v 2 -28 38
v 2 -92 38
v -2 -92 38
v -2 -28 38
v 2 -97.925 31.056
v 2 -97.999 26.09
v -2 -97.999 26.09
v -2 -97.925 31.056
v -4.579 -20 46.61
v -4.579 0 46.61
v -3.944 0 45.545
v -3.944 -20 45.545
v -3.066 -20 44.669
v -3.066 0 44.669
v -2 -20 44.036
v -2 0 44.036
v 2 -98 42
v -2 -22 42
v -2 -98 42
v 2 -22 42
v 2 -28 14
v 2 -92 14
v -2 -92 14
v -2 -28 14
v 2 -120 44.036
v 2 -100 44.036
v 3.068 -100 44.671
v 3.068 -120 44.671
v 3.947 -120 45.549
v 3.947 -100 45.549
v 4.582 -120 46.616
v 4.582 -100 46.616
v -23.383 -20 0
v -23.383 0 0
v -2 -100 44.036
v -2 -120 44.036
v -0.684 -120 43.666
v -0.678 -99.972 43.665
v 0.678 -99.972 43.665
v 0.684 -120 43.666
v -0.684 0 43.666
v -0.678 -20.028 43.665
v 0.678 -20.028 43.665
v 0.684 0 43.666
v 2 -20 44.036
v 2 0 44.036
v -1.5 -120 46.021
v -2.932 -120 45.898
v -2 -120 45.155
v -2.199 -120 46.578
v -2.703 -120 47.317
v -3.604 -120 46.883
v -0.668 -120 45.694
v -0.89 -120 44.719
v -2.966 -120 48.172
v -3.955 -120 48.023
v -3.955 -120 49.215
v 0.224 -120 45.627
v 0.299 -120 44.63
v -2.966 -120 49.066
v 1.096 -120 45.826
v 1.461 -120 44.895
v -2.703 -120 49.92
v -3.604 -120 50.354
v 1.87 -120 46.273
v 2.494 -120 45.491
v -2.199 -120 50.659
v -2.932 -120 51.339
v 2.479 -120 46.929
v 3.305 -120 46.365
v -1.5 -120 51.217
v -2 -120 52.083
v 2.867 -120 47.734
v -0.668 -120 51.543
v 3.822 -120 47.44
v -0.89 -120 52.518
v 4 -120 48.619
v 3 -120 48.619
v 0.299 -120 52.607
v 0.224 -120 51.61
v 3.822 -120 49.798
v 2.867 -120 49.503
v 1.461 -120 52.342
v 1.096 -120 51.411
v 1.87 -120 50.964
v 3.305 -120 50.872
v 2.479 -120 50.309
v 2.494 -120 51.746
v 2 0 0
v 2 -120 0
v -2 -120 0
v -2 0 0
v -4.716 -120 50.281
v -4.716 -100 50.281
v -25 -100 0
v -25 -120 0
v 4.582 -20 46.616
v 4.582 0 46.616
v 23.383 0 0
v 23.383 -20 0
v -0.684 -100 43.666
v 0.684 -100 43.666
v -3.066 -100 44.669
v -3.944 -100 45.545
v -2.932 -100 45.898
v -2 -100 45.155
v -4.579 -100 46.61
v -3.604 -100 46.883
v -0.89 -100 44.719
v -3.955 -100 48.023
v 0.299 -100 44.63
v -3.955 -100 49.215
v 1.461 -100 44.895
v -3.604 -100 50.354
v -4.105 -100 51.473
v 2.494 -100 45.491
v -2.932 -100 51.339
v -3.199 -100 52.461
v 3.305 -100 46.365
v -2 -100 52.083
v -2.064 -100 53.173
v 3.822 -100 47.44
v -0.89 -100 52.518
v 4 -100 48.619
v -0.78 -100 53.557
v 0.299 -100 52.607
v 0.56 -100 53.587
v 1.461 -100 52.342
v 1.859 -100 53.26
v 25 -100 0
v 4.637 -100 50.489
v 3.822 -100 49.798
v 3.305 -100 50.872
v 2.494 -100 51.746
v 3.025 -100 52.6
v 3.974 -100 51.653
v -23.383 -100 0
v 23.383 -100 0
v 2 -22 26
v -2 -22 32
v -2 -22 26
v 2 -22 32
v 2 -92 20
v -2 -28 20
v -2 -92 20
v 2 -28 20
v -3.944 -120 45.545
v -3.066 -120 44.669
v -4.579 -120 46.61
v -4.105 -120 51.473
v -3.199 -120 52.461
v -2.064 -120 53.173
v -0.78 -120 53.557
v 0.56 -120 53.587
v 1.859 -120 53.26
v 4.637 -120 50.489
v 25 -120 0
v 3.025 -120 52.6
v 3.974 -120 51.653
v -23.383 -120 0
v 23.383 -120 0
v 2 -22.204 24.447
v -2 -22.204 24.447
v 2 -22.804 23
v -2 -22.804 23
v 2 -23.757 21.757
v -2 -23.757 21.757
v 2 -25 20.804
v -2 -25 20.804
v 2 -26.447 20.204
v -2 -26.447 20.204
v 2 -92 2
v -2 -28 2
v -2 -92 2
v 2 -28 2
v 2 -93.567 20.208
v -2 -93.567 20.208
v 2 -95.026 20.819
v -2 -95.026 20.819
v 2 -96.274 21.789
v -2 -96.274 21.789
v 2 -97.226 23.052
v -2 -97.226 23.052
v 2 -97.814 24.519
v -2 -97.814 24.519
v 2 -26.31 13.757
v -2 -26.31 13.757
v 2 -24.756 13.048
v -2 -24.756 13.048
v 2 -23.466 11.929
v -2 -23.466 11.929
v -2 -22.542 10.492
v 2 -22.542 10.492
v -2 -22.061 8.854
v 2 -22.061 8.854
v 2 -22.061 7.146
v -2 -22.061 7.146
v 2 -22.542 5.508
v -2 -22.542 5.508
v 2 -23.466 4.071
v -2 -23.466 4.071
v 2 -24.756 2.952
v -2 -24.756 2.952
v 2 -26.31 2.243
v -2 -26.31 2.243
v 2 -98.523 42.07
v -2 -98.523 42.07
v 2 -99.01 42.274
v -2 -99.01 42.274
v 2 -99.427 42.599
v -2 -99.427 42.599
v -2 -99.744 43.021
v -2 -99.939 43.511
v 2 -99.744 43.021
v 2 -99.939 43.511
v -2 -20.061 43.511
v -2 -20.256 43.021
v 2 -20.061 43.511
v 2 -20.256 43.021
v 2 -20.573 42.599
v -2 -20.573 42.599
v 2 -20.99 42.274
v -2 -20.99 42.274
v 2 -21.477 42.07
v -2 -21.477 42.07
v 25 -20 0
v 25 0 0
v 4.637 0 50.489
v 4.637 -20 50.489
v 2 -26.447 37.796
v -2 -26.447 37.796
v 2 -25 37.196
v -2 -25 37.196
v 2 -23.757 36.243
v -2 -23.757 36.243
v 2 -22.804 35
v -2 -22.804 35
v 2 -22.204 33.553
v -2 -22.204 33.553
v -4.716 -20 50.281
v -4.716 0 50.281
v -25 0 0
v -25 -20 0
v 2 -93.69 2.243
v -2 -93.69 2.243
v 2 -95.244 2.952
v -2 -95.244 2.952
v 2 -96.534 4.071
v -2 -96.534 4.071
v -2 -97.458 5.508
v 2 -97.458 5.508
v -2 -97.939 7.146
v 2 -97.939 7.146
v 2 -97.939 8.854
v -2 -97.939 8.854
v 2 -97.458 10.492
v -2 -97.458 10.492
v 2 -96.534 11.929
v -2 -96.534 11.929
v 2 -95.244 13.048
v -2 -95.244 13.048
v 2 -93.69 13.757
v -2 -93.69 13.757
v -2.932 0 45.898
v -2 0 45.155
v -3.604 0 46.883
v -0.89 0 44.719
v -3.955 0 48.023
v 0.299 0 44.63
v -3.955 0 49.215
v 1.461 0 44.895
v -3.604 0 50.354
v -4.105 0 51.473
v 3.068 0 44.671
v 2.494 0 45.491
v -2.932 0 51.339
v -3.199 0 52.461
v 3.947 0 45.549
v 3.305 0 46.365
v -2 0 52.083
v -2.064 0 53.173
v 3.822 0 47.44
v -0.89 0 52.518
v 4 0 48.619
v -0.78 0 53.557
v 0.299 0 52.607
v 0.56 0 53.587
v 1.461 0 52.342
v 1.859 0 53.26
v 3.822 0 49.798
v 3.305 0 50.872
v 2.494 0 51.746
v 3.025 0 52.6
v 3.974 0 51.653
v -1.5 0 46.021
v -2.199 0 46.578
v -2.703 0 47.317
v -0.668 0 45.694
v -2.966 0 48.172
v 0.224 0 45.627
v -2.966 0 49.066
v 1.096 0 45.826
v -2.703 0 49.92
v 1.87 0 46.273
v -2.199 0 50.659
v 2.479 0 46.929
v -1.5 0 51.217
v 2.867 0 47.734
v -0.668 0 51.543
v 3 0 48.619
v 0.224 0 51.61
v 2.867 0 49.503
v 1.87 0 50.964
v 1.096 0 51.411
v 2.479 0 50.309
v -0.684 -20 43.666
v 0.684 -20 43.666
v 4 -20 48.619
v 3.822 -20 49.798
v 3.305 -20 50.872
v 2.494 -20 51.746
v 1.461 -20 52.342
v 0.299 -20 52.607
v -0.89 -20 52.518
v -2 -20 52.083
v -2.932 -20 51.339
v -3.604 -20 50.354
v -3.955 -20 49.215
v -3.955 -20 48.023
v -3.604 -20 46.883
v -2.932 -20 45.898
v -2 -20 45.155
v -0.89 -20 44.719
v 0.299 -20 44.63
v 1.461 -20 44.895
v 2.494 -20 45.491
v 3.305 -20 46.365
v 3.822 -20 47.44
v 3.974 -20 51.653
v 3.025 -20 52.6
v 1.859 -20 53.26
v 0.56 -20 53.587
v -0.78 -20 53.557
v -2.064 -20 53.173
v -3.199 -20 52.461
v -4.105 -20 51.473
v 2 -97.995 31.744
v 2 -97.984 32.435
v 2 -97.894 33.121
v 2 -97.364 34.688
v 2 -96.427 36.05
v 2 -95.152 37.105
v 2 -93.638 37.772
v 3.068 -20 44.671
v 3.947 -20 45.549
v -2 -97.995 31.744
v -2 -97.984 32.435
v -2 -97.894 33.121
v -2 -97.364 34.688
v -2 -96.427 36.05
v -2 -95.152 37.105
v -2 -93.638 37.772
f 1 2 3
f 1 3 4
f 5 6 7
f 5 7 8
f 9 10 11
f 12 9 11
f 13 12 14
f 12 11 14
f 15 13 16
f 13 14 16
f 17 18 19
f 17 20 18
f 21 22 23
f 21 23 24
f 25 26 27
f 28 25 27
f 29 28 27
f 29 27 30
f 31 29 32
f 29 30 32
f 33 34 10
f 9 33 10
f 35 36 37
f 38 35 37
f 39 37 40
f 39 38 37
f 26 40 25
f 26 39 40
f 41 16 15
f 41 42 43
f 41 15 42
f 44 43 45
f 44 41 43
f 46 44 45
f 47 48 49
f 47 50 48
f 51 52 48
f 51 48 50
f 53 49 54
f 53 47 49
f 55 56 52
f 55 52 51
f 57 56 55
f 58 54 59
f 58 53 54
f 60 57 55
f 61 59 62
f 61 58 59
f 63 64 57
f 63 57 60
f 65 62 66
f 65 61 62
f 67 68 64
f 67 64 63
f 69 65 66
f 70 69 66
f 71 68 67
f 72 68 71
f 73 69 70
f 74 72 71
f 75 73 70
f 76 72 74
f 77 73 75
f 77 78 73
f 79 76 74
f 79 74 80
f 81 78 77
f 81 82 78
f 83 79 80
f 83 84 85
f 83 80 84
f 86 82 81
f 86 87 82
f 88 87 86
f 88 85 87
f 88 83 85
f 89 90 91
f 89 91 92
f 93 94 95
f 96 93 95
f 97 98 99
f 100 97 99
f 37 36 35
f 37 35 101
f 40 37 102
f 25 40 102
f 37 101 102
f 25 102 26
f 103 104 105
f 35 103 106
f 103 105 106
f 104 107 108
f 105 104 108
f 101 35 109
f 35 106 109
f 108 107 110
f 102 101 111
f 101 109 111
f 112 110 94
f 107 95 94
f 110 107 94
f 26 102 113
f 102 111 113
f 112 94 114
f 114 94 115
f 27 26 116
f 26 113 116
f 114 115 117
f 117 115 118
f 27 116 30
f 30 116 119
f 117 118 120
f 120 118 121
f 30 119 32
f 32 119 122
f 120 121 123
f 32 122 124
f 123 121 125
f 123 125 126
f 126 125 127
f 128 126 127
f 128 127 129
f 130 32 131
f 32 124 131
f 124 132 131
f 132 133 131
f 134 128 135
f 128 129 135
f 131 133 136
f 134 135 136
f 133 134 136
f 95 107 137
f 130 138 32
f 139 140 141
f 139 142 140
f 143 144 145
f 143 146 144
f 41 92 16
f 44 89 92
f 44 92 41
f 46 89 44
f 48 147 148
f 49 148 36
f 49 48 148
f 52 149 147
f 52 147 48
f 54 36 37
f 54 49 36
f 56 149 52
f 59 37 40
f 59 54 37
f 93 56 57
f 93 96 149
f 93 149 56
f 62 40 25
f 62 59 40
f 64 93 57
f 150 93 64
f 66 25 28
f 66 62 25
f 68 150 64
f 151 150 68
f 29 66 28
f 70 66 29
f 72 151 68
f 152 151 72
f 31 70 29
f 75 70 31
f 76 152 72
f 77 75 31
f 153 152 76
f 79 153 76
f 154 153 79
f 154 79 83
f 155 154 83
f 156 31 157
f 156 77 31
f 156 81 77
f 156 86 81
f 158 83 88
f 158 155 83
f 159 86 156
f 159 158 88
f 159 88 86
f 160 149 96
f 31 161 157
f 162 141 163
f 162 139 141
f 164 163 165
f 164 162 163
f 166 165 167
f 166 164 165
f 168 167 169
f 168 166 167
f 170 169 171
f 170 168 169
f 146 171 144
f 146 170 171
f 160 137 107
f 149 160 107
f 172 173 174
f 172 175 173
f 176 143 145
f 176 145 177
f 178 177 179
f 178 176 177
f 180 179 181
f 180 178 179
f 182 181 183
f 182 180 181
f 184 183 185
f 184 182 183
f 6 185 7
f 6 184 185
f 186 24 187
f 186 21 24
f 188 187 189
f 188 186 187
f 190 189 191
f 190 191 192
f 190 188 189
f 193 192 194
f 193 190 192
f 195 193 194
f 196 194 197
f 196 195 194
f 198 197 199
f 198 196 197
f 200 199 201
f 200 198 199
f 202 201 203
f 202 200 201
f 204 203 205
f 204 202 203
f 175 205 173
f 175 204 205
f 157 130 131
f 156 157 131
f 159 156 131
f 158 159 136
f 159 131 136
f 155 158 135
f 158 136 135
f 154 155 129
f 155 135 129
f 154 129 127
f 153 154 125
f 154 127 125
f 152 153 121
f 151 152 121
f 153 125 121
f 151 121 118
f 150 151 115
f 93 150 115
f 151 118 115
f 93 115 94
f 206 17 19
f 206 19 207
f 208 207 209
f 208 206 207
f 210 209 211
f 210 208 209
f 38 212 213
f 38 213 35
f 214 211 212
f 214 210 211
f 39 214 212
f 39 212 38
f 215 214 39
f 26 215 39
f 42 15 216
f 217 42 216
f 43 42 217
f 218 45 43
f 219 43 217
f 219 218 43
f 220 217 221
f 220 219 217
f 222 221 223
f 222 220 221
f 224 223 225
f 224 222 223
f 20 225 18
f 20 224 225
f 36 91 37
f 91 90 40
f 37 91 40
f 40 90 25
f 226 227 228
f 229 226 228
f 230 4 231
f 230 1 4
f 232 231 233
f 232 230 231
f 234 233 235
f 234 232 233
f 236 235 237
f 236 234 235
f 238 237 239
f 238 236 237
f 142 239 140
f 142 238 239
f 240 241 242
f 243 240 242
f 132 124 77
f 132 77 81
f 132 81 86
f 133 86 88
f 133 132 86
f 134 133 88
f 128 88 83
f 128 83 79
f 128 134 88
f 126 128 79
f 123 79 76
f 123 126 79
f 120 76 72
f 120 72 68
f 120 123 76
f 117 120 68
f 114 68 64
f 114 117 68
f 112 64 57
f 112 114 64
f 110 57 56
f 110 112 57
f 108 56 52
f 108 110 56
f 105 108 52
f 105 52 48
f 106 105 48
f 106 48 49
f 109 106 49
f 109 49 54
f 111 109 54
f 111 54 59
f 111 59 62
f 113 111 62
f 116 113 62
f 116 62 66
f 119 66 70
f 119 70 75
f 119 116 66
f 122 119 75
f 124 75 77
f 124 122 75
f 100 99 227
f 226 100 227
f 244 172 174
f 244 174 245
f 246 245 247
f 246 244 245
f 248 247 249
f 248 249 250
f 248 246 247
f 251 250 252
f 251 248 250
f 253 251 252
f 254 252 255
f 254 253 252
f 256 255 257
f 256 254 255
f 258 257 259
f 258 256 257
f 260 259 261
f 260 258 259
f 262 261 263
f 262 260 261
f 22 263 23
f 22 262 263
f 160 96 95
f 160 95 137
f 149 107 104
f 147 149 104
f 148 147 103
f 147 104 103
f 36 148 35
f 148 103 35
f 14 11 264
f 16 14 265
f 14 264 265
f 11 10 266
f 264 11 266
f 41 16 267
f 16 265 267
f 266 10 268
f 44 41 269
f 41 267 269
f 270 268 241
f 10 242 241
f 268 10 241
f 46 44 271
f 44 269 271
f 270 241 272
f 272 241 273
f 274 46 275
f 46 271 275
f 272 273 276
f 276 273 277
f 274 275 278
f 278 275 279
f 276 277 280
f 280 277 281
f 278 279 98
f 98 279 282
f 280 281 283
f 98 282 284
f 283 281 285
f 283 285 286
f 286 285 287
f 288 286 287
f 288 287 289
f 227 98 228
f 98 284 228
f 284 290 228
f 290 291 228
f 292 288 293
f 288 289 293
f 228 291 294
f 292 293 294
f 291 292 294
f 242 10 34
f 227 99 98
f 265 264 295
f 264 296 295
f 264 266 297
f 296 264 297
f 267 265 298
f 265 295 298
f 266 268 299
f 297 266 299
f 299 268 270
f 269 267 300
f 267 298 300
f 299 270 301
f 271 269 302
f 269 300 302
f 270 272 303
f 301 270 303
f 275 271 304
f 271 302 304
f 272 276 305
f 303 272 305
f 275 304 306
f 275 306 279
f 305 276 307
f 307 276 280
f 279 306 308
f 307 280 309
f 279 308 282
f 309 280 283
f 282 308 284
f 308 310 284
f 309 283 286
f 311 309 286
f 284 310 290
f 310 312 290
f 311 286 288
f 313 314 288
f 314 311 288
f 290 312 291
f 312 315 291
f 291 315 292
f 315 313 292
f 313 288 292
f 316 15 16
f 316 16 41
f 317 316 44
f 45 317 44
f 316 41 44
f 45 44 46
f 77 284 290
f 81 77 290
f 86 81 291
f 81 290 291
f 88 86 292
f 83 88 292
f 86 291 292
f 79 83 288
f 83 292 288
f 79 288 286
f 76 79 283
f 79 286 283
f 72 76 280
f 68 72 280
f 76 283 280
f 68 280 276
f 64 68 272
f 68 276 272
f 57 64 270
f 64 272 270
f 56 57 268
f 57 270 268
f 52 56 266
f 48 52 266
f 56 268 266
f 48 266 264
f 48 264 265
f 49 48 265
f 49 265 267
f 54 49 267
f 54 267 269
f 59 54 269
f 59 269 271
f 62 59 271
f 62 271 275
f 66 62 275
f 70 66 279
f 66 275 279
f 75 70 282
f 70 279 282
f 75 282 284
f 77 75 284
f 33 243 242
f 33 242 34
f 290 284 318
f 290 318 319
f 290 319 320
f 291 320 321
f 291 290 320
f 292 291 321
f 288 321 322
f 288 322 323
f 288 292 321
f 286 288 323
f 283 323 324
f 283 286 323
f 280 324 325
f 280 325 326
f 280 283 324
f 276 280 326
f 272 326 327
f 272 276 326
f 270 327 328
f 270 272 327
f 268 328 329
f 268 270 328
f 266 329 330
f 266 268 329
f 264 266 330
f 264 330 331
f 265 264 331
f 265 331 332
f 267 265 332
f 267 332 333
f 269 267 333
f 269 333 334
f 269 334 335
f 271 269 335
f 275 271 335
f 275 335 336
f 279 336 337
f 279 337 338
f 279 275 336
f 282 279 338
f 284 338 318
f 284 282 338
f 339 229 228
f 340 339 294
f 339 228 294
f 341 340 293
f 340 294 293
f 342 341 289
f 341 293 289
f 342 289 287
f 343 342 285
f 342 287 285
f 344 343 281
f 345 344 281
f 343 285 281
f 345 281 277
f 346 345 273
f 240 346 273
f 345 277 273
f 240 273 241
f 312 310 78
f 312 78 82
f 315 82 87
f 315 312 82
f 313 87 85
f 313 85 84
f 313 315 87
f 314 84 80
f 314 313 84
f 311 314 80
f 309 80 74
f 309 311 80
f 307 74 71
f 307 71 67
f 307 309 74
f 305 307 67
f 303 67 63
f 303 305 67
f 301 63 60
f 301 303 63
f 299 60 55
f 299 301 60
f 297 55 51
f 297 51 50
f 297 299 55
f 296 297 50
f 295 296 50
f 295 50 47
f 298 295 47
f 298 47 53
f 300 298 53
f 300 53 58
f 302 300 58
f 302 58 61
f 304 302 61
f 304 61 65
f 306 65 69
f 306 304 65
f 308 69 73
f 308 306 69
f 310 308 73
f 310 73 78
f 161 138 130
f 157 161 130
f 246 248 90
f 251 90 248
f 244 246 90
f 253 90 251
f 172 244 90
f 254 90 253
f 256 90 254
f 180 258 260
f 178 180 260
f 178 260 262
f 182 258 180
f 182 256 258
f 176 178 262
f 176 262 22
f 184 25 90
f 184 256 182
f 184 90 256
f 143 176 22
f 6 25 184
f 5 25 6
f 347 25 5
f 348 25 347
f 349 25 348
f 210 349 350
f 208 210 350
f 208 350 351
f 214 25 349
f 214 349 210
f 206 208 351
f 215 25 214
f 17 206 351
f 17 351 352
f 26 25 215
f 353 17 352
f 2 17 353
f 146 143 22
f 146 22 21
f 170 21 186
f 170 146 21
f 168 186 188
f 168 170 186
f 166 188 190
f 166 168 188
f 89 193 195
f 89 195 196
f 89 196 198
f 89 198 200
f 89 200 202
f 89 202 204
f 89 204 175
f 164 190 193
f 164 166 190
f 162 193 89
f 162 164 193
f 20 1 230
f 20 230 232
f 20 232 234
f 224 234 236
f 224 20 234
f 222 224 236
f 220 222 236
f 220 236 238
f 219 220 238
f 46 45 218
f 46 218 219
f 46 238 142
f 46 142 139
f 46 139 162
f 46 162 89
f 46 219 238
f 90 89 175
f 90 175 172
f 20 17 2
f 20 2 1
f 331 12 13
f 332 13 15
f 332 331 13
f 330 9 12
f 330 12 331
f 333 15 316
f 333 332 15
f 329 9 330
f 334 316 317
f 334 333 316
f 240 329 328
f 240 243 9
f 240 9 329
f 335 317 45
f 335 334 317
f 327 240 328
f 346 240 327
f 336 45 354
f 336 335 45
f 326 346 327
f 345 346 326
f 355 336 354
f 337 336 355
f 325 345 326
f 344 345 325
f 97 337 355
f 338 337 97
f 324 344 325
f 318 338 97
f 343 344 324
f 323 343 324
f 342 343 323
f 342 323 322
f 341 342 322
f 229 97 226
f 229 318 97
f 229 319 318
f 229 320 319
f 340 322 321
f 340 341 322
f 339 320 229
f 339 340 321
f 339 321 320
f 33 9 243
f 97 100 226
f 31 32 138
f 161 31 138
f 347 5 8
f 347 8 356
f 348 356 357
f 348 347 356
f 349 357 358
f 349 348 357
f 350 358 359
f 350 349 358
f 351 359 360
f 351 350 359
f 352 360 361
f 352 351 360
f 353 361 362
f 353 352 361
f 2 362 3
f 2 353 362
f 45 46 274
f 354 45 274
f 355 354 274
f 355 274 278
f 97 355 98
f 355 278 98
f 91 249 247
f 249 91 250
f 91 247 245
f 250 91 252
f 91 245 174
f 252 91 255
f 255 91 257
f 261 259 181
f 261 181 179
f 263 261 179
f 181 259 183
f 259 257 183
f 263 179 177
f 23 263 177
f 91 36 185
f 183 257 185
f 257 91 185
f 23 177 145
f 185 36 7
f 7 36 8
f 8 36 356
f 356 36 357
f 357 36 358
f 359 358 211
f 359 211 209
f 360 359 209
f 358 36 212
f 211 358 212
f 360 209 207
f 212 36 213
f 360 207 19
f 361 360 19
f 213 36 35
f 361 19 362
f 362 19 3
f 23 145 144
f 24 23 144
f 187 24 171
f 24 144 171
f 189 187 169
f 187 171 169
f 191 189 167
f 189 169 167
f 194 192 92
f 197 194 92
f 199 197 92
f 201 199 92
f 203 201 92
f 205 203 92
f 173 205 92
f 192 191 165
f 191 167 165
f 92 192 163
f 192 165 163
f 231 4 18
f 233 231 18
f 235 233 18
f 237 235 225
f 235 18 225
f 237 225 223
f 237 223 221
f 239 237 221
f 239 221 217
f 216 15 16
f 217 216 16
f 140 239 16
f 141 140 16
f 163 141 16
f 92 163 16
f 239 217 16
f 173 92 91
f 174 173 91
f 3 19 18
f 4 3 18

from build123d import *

# Parameters (mm, degrees)
F0_W     = 120
F0_H     = 48
F2_DEPTH = 2
F1_R     = 4
F1_R_2   = 3
F3_DEPTH = 120
F4_START = 100
F4_DEPTH = 20
F5_DEPTH = 20
F6_DEPTH = 120


with BuildPart() as f2:
    # F0 (on Right) → F2 (new body, symmetric)
    with BuildSketch(Plane.YZ):
        with Locations((-60, 24)):
            Rectangle(F0_W, F0_H)
        with BuildLine():
            ThreePointArc((-92, 2), (-98, 8), (-92, 14))
            Line((-92, 14), (-28, 14))
            ThreePointArc((-28, 14), (-22, 8), (-28, 2))
            Line((-28, 2), (-92, 2))
        make_face(mode=Mode.SUBTRACT)
        with BuildLine():
            ThreePointArc((-92, 20), (-96.2741732358, 21.7891279822), (-97.9993321593, 26.0895189498))
            Line((-97.9993321593, 26.0895189498), (-97.9252290308, 31.0557220047))
            ThreePointArc((-97.9252290308, 31.0557220047), (-97.9993321593, 32.0895189498), (-97.8944173164, 33.1206446807))
            ThreePointArc((-97.8944173164, 33.1206446807), (-95.8259725506, 36.621897234), (-92, 38))
            Line((-92, 38), (-28, 38))
            ThreePointArc((-28, 38), (-23.7573593129, 36.2426406871), (-22, 32))
            Line((-22, 32), (-22, 26))
            ThreePointArc((-22, 26), (-23.7573593129, 21.7573593129), (-28, 20))
            Line((-28, 20), (-92, 20))
        make_face(mode=Mode.SUBTRACT)
        with BuildLine():
            ThreePointArc((-98, 42), (-100, 44), (-98, 46))
            Line((-98, 46), (-22, 46))
            ThreePointArc((-22, 46), (-20, 44), (-22, 42))
            Line((-22, 42), (-98, 42))
        make_face(mode=Mode.SUBTRACT)
    extrude(amount=F2_DEPTH, both=True)

    # F1 (on Front) → F3 (cut)
    with BuildSketch(Plane.XZ):
        with BuildLine():
            ThreePointArc((4.5815332864, 46.6162963505), (4.8942653398, 47.5958601642), (5, 48.6186831126))
            ThreePointArc((5, 48.6186831126), (4.9084273131, 49.5712277634), (4.6370634753, 50.4888815849))
            ThreePointArc((4.6370634753, 50.4888815849), (-0.1113152462, 53.6174438506), (-4.7157188179, 50.2806085112))
            ThreePointArc((-4.7157188179, 50.2806085112), (-4.9965307646, 48.4324565894), (-4.5789234689, 46.6103355665))
            ThreePointArc((-4.5789234689, 46.6103355665), (-3.5323110201, 45.0799292561), (-2, 44.0361074177))
            ThreePointArc((-2, 44.0361074177), (0, 43.6186831126), (2, 44.0361074177))
            ThreePointArc((2, 44.0361074177), (3.5346129678, 45.0822285084), (4.5815332864, 46.6162963505))
        make_face()
        with Locations((0, 48.6186831126)):
            Circle(F1_R, mode=Mode.SUBTRACT)
        with Locations((0, 48.6186831126)):
            Circle(F1_R)
        with Locations((0, 48.6186831126)):
            Circle(F1_R_2, mode=Mode.SUBTRACT)
        with Locations((0, 48.6186831126)):
            Circle(F1_R_2)
    extrude(amount=F3_DEPTH, mode=Mode.SUBTRACT)


with BuildPart() as f4:
    # F1 (on Front) → F4 (new body)
    with BuildSketch(Plane.XZ.offset(F4_START)):
        with BuildLine():
            ThreePointArc((-4.5789234689, 46.6103355665), (-4.9965307646, 48.4324565894), (-4.7157188179, 50.2806085112))
            Line((-4.7157188179, 50.2806085112), (-25, 0))
            Line((-25, 0), (-23.3825374389, 0))
            Line((-23.3825374389, 0), (-4.5789234689, 46.6103355665))
        make_face()
        with BuildLine():
            ThreePointArc((4.6370634753, 50.4888815849), (4.9084273131, 49.5712277634), (5, 48.6186831126))
            ThreePointArc((5, 48.6186831126), (4.8942653398, 47.5958601642), (4.5815332864, 46.6162963505))
            Line((4.5815332864, 46.6162963505), (23.3825970811, 0))
            Line((23.3825970811, 0), (25, 0))
            Line((25, 0), (4.6370634753, 50.4888815849))
        make_face()
        with BuildLine():
            ThreePointArc((4.5815332864, 46.6162963505), (4.8942653398, 47.5958601642), (5, 48.6186831126))
            ThreePointArc((5, 48.6186831126), (4.9084273131, 49.5712277634), (4.6370634753, 50.4888815849))
            ThreePointArc((4.6370634753, 50.4888815849), (-0.1113152462, 53.6174438506), (-4.7157188179, 50.2806085112))
            ThreePointArc((-4.7157188179, 50.2806085112), (-4.9965307646, 48.4324565894), (-4.5789234689, 46.6103355665))
            ThreePointArc((-4.5789234689, 46.6103355665), (-3.5323110201, 45.0799292561), (-2, 44.0361074177))
            ThreePointArc((-2, 44.0361074177), (0, 43.6186831126), (2, 44.0361074177))
            ThreePointArc((2, 44.0361074177), (3.5346129678, 45.0822285084), (4.5815332864, 46.6162963505))
        make_face()
        with Locations((0, 48.6186831126)):
            Circle(F1_R, mode=Mode.SUBTRACT)
    extrude(amount=F4_DEPTH)


with BuildPart() as f5:
    # F1 (on Front) → F5 (new body)
    with BuildSketch(Plane.XZ):
        with BuildLine():
            ThreePointArc((-4.5789234689, 46.6103355665), (-4.9965307646, 48.4324565894), (-4.7157188179, 50.2806085112))
            Line((-4.7157188179, 50.2806085112), (-25, 0))
            Line((-25, 0), (-23.3825374389, 0))
            Line((-23.3825374389, 0), (-4.5789234689, 46.6103355665))
        make_face()
        with BuildLine():
            ThreePointArc((4.6370634753, 50.4888815849), (4.9084273131, 49.5712277634), (5, 48.6186831126))
            ThreePointArc((5, 48.6186831126), (4.8942653398, 47.5958601642), (4.5815332864, 46.6162963505))
            Line((4.5815332864, 46.6162963505), (23.3825970811, 0))
            Line((23.3825970811, 0), (25, 0))
            Line((25, 0), (4.6370634753, 50.4888815849))
        make_face()
        with BuildLine():
            ThreePointArc((4.5815332864, 46.6162963505), (4.8942653398, 47.5958601642), (5, 48.6186831126))
            ThreePointArc((5, 48.6186831126), (4.9084273131, 49.5712277634), (4.6370634753, 50.4888815849))
            ThreePointArc((4.6370634753, 50.4888815849), (-0.1113152462, 53.6174438506), (-4.7157188179, 50.2806085112))
            ThreePointArc((-4.7157188179, 50.2806085112), (-4.9965307646, 48.4324565894), (-4.5789234689, 46.6103355665))
            ThreePointArc((-4.5789234689, 46.6103355665), (-3.5323110201, 45.0799292561), (-2, 44.0361074177))
            ThreePointArc((-2, 44.0361074177), (0, 43.6186831126), (2, 44.0361074177))
            ThreePointArc((2, 44.0361074177), (3.5346129678, 45.0822285084), (4.5815332864, 46.6162963505))
        make_face()
        with Locations((0, 48.6186831126)):
            Circle(F1_R, mode=Mode.SUBTRACT)
    extrude(amount=F5_DEPTH)


with BuildPart() as f6:
    # F1 (on Front) → F6 (new body)
    with BuildSketch(Plane.XZ):
        with Locations((0, 48.6186831126)):
            Circle(F1_R)
        with Locations((0, 48.6186831126)):
            Circle(F1_R_2, mode=Mode.SUBTRACT)
    extrude(amount=F6_DEPTH)


solid = Compound([f2.part, f4.part, f5.part, f6.part])
